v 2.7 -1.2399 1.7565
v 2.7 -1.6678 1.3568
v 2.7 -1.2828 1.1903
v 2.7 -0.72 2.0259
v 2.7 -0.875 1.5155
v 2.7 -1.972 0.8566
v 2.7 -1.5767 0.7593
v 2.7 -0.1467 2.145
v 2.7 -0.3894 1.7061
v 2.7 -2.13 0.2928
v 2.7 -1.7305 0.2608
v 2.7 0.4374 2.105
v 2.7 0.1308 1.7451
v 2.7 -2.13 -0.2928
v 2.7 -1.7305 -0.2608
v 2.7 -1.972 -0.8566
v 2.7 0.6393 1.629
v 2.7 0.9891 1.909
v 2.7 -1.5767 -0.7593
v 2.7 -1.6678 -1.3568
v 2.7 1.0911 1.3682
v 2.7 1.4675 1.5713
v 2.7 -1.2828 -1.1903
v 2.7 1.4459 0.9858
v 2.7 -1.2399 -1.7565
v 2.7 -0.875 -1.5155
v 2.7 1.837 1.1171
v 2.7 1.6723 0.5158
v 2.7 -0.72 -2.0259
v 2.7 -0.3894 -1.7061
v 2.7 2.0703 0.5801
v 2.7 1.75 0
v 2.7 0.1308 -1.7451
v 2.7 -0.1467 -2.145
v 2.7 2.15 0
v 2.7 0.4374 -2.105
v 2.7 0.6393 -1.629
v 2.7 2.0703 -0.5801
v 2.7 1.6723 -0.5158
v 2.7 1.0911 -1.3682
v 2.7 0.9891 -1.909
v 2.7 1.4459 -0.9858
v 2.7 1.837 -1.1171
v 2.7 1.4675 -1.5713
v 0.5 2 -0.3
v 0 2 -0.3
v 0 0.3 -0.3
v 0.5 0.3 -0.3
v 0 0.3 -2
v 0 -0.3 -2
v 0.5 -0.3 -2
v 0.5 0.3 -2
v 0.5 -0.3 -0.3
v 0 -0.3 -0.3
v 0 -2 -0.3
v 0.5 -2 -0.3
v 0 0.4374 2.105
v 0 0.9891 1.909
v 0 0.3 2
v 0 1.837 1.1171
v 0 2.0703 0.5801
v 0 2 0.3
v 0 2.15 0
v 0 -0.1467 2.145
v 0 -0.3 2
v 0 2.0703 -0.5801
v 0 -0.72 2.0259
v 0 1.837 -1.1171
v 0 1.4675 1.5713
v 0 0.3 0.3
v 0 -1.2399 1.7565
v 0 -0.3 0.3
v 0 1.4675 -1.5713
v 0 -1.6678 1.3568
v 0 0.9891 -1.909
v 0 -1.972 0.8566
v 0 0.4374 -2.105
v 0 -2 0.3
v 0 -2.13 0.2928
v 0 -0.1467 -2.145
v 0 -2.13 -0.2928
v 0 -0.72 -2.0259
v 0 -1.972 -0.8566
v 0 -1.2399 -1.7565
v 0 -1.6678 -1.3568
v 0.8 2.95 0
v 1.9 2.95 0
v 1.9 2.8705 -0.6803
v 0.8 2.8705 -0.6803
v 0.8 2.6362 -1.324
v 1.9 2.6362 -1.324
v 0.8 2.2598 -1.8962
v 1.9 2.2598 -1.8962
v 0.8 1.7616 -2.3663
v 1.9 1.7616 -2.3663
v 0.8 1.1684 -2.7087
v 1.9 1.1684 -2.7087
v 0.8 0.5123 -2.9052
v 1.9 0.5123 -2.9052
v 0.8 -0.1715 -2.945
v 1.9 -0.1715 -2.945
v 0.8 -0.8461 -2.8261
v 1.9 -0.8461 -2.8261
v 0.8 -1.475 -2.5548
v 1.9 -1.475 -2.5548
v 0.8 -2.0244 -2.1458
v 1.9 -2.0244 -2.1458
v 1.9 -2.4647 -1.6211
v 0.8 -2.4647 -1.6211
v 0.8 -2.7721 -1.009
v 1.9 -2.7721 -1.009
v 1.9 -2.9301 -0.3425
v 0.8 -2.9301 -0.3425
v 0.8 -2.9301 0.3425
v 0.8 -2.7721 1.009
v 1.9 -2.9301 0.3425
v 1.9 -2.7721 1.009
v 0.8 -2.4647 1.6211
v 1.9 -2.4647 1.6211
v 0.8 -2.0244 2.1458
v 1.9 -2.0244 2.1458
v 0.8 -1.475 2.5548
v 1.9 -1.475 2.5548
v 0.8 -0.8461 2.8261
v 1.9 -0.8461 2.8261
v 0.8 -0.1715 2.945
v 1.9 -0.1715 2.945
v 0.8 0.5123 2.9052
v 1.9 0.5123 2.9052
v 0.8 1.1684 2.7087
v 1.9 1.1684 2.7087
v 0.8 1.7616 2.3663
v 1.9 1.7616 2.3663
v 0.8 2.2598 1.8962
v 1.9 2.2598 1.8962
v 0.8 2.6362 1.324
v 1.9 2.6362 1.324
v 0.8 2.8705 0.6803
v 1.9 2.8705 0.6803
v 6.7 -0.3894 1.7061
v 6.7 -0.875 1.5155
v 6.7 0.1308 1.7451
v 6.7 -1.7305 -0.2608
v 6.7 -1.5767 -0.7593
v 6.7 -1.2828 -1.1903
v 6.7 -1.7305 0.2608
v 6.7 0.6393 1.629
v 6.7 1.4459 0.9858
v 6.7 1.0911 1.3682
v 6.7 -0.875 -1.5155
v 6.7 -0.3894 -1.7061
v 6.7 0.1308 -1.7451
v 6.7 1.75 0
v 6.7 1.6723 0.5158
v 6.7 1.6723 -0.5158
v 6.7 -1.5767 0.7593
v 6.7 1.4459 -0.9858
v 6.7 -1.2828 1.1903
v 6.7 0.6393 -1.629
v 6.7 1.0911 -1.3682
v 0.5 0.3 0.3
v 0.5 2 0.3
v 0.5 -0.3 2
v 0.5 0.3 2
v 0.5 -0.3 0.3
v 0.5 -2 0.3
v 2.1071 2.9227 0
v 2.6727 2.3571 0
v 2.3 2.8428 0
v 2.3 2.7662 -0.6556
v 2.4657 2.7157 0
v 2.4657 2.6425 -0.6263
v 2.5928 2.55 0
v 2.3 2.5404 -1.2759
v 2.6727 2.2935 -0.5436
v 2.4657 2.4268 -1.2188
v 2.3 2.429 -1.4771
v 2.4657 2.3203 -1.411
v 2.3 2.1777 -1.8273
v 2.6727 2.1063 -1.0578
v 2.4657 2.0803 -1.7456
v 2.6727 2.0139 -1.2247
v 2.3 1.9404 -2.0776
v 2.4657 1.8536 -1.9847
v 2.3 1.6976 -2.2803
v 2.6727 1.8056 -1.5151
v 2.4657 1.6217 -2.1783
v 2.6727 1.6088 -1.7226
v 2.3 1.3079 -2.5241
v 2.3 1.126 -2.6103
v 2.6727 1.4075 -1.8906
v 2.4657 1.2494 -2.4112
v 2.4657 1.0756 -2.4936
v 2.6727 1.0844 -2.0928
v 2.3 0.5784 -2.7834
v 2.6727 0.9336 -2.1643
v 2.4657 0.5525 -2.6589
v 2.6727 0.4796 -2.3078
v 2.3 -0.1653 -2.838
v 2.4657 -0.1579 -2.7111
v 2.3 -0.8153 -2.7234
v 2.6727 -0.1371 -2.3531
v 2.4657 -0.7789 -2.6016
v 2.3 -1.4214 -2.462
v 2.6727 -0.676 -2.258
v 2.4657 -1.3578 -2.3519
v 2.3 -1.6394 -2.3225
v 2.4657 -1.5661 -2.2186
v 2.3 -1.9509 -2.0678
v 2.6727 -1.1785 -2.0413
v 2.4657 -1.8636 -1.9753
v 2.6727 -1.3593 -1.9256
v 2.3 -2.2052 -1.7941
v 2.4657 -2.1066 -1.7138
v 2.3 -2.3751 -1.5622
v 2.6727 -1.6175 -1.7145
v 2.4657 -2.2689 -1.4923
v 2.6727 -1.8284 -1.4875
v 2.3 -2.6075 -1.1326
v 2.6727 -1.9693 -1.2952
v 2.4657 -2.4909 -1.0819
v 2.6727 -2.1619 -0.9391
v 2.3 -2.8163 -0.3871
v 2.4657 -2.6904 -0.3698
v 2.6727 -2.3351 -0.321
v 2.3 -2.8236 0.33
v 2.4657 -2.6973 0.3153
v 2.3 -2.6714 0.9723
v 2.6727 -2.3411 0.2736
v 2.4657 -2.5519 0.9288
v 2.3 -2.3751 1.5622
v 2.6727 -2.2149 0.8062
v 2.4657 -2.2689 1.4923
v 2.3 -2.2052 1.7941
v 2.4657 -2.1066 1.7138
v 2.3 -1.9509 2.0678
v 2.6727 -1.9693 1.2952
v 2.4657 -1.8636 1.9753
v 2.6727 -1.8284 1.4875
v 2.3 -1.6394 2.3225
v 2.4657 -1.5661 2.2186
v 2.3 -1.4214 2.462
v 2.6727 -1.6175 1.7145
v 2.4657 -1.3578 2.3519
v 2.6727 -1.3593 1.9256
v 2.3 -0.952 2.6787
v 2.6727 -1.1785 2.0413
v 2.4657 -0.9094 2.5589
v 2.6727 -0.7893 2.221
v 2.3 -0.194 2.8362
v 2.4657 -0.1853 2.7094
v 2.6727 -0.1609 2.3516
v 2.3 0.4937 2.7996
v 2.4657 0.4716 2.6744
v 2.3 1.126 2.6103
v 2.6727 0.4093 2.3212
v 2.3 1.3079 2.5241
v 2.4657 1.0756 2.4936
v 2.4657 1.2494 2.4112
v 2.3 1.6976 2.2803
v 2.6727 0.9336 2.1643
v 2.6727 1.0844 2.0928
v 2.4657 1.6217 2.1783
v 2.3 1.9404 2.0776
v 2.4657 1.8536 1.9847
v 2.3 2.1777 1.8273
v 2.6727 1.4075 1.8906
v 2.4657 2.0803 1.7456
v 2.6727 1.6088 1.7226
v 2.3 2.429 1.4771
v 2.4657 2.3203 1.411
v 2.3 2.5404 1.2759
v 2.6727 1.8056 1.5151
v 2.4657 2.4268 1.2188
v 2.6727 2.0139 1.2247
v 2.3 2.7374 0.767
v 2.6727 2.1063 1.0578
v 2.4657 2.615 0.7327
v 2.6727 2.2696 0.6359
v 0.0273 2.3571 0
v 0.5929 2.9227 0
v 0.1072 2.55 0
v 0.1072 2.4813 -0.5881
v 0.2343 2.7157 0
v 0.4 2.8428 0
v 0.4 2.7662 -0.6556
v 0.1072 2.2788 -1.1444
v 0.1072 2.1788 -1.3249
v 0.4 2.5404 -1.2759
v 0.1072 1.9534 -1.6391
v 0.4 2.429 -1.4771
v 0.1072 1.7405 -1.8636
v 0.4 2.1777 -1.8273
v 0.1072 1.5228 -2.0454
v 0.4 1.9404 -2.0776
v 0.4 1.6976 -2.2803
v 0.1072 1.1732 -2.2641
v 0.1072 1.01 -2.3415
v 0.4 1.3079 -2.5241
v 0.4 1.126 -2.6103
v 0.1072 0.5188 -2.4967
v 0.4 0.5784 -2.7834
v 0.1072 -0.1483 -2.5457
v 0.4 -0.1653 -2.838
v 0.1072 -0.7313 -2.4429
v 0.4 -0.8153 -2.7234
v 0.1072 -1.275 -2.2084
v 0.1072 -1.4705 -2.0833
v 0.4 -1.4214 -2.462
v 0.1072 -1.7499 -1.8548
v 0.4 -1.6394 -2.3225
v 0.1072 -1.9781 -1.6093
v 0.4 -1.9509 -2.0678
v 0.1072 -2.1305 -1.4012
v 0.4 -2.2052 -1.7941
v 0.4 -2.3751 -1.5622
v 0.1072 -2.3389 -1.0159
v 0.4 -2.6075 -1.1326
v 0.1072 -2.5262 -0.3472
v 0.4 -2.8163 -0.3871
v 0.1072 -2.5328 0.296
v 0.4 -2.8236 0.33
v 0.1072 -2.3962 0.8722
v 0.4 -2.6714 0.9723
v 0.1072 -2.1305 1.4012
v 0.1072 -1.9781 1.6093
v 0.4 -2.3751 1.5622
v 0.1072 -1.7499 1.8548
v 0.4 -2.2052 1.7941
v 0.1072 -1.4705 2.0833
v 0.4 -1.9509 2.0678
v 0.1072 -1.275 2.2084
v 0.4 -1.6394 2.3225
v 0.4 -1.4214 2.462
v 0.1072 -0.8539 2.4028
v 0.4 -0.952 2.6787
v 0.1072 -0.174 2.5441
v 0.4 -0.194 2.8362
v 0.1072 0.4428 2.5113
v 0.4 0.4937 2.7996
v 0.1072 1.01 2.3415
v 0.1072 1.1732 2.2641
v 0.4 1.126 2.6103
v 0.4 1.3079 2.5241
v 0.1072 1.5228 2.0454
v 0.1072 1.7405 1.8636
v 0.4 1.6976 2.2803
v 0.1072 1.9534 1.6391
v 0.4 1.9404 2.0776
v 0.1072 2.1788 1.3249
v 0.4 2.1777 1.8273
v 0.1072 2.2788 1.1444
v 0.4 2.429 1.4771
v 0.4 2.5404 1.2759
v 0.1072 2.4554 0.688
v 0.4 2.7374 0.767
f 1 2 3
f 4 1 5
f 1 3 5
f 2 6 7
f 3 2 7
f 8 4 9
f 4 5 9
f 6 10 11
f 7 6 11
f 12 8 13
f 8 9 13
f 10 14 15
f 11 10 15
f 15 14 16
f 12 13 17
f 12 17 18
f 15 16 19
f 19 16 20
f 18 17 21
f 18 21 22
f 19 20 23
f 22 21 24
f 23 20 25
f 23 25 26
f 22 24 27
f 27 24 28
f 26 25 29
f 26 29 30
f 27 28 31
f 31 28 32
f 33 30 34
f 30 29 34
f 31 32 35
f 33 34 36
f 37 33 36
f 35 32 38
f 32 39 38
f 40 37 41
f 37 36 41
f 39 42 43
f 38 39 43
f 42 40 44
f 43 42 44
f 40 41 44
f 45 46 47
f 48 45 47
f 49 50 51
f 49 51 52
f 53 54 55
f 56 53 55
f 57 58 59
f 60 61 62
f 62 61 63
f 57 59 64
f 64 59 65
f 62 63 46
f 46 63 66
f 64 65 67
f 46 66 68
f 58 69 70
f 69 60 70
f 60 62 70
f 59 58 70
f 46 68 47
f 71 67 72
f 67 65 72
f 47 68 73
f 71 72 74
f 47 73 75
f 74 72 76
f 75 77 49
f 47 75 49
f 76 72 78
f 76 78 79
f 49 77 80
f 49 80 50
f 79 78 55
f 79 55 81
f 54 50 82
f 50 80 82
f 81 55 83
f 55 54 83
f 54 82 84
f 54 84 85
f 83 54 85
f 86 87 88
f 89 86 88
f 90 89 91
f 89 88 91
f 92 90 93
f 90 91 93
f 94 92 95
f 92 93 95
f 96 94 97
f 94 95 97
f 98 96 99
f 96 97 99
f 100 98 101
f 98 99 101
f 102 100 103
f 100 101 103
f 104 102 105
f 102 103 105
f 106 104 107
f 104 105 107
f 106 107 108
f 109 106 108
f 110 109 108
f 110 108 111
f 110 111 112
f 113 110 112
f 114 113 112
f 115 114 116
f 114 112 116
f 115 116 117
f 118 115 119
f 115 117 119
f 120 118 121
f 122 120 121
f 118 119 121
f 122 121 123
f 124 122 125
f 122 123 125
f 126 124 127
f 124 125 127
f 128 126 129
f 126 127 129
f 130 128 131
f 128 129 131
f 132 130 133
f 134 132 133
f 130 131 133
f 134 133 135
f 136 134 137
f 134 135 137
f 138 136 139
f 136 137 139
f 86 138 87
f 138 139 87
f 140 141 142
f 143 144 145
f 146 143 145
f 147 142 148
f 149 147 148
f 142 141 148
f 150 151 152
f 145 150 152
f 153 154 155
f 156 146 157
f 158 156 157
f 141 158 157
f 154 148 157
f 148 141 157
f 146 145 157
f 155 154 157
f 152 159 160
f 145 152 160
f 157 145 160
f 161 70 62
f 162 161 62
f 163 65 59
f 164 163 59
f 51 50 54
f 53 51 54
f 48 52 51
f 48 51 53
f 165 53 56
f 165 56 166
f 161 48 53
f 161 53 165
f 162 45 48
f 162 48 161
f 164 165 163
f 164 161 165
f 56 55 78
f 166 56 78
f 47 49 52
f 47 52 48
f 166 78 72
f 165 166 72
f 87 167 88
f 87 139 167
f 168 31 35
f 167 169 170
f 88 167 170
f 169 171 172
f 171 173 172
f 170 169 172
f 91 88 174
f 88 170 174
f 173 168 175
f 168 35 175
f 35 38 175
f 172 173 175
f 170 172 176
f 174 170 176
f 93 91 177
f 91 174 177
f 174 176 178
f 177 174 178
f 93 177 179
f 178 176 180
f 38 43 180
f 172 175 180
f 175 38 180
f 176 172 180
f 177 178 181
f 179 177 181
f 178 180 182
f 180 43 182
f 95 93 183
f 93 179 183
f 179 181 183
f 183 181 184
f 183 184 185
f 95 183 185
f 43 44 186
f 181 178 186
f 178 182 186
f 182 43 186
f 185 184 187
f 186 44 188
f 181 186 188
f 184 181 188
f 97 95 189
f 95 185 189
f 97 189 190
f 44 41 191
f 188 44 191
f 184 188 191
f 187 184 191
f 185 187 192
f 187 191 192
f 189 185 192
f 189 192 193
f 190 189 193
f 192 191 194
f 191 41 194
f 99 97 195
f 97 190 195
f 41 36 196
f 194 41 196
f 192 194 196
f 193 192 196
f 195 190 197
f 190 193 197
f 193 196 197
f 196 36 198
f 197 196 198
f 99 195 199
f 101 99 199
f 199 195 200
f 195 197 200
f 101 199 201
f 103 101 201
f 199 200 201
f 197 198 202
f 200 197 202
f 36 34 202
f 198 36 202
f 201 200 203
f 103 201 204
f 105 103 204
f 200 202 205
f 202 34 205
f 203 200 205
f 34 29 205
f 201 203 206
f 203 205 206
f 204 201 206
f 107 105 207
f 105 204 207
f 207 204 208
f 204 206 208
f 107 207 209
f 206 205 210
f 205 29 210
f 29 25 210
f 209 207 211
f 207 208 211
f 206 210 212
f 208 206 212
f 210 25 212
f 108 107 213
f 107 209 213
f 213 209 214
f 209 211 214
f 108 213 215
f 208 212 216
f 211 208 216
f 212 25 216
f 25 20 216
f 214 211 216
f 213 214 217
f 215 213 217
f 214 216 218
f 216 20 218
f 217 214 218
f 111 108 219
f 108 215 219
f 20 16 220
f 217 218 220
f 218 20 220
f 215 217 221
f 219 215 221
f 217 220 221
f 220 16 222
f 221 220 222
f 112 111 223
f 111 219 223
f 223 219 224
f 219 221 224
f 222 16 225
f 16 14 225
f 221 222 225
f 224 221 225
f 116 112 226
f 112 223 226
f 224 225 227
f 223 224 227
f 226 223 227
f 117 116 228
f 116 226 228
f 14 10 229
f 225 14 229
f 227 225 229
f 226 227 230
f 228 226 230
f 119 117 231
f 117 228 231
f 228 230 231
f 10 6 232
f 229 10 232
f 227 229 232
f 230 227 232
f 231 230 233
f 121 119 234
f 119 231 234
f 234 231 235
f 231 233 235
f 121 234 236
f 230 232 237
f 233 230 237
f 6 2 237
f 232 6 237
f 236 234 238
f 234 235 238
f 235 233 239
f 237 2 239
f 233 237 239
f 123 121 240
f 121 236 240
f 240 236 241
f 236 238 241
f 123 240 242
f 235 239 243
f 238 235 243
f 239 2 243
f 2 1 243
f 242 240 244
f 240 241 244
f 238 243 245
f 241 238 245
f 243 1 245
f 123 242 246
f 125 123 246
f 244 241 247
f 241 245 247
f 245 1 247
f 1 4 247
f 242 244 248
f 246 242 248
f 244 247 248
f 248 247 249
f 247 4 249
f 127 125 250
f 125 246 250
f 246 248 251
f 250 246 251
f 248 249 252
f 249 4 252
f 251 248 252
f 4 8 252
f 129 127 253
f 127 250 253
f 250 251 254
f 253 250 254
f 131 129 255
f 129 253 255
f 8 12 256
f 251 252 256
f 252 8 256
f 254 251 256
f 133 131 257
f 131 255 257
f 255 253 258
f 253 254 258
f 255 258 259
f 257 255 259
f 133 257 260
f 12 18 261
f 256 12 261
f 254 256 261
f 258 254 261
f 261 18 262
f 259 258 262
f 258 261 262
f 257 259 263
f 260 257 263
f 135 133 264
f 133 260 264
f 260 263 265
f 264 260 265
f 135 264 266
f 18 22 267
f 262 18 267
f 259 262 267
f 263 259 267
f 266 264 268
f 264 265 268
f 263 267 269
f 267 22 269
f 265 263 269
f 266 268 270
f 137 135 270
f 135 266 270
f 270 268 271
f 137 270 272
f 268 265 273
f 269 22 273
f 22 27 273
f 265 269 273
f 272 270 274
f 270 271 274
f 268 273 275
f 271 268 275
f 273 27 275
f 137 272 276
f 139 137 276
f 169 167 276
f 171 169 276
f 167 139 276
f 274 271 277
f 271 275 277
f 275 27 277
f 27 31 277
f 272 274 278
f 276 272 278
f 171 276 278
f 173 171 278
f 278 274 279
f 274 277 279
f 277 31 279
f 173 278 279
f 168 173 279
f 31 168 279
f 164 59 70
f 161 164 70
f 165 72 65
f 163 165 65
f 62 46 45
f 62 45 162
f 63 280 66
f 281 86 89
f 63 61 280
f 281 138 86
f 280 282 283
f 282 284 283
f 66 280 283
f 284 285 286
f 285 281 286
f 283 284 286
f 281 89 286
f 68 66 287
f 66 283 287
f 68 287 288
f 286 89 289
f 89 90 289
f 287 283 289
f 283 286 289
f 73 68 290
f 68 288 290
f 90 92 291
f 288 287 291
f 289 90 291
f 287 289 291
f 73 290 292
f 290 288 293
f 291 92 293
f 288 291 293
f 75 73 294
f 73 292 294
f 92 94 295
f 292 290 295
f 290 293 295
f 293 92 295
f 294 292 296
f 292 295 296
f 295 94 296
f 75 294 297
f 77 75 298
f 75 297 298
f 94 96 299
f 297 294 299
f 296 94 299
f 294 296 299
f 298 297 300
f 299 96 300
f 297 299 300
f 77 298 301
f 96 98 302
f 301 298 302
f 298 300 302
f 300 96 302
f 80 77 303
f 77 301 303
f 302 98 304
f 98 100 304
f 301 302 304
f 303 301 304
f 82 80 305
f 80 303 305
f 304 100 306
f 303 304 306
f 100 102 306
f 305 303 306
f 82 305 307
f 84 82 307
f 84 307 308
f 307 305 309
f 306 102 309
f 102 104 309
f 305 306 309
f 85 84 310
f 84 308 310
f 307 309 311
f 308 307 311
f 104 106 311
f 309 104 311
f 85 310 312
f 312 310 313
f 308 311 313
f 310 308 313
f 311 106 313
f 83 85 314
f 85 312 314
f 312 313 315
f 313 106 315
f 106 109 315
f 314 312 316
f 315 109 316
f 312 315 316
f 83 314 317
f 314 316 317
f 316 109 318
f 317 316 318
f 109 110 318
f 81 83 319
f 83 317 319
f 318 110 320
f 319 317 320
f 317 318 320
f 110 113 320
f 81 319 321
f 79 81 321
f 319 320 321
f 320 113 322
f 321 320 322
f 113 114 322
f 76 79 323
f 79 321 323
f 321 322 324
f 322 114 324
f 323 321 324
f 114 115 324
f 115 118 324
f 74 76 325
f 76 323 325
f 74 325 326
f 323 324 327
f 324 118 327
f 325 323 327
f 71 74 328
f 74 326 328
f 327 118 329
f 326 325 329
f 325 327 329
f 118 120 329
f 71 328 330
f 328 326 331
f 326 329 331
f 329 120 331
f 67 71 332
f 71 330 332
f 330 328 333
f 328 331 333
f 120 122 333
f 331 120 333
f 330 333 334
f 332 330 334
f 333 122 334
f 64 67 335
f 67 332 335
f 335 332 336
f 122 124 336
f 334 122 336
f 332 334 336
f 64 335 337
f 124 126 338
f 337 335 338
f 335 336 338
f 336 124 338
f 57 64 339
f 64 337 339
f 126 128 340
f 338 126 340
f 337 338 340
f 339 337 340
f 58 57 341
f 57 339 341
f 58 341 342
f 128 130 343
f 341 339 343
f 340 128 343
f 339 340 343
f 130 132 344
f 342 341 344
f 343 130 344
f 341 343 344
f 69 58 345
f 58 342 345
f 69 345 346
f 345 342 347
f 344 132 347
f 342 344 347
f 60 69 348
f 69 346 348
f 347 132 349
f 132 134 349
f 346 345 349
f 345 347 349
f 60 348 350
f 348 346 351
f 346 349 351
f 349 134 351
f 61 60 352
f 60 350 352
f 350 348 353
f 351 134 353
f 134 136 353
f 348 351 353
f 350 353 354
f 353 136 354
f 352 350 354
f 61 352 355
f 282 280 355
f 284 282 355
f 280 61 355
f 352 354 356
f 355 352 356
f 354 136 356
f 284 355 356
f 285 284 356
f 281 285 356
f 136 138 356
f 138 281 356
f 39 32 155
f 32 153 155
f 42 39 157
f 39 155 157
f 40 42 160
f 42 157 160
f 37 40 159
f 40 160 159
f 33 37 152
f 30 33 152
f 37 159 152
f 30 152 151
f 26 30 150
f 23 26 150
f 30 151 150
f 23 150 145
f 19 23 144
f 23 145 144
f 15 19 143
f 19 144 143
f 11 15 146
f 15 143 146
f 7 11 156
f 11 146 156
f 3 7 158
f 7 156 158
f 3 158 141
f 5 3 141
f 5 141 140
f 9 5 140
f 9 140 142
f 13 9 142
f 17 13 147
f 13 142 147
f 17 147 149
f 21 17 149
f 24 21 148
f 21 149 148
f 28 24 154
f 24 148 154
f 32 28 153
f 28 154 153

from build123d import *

# Parameters (mm, degrees)
SKETCH_2_W          = 1.7
SKETCH_2_H          = 0.6
SKETCH_2_W_2        = 0.6
SKETCH_2_H_2        = 1.7
CUT_EXTRUDE_1_DEPTH = 0.5
FILLET_1_R          = 0.8


with BuildPart() as part:
    # 草图1 → 旋转1 (revolve)
    with BuildSketch(Plane.XY):
        Polygon((0, 0), (0, 2.95), (2.7, 2.95), (2.7, 1.75), (6.7, 1.75), (6.7, 0), align=None)
    revolve(axis=Axis((6.7, 0, 0), (-1, 0, 0)))

    # 草图2 → 切除-拉伸1 (cut)
    with BuildSketch(Plane.ZY):
        with Locations((1.15, 0)):
            Rectangle(SKETCH_2_W, SKETCH_2_H)
        with Locations((0, -1.15)):
            Rectangle(SKETCH_2_W_2, SKETCH_2_H_2)
        Rectangle(SKETCH_2_W_2, SKETCH_2_H)
        with Locations((0, 1.15)):
            Rectangle(SKETCH_2_W_2, SKETCH_2_H_2)
        with Locations((-1.15, 0)):
            Rectangle(SKETCH_2_W, SKETCH_2_H)
    extrude(amount=-CUT_EXTRUDE_1_DEPTH, mode=Mode.SUBTRACT)

    # 圆角1
    fillet_1_edges = [part.edges().sort_by_distance(p)[0] for p in [
        (2.7, -2.95, 0),
        (0, -2.95, 0),
    ]]
    fillet(fillet_1_edges, radius=FILLET_1_R)


solid = part.part
